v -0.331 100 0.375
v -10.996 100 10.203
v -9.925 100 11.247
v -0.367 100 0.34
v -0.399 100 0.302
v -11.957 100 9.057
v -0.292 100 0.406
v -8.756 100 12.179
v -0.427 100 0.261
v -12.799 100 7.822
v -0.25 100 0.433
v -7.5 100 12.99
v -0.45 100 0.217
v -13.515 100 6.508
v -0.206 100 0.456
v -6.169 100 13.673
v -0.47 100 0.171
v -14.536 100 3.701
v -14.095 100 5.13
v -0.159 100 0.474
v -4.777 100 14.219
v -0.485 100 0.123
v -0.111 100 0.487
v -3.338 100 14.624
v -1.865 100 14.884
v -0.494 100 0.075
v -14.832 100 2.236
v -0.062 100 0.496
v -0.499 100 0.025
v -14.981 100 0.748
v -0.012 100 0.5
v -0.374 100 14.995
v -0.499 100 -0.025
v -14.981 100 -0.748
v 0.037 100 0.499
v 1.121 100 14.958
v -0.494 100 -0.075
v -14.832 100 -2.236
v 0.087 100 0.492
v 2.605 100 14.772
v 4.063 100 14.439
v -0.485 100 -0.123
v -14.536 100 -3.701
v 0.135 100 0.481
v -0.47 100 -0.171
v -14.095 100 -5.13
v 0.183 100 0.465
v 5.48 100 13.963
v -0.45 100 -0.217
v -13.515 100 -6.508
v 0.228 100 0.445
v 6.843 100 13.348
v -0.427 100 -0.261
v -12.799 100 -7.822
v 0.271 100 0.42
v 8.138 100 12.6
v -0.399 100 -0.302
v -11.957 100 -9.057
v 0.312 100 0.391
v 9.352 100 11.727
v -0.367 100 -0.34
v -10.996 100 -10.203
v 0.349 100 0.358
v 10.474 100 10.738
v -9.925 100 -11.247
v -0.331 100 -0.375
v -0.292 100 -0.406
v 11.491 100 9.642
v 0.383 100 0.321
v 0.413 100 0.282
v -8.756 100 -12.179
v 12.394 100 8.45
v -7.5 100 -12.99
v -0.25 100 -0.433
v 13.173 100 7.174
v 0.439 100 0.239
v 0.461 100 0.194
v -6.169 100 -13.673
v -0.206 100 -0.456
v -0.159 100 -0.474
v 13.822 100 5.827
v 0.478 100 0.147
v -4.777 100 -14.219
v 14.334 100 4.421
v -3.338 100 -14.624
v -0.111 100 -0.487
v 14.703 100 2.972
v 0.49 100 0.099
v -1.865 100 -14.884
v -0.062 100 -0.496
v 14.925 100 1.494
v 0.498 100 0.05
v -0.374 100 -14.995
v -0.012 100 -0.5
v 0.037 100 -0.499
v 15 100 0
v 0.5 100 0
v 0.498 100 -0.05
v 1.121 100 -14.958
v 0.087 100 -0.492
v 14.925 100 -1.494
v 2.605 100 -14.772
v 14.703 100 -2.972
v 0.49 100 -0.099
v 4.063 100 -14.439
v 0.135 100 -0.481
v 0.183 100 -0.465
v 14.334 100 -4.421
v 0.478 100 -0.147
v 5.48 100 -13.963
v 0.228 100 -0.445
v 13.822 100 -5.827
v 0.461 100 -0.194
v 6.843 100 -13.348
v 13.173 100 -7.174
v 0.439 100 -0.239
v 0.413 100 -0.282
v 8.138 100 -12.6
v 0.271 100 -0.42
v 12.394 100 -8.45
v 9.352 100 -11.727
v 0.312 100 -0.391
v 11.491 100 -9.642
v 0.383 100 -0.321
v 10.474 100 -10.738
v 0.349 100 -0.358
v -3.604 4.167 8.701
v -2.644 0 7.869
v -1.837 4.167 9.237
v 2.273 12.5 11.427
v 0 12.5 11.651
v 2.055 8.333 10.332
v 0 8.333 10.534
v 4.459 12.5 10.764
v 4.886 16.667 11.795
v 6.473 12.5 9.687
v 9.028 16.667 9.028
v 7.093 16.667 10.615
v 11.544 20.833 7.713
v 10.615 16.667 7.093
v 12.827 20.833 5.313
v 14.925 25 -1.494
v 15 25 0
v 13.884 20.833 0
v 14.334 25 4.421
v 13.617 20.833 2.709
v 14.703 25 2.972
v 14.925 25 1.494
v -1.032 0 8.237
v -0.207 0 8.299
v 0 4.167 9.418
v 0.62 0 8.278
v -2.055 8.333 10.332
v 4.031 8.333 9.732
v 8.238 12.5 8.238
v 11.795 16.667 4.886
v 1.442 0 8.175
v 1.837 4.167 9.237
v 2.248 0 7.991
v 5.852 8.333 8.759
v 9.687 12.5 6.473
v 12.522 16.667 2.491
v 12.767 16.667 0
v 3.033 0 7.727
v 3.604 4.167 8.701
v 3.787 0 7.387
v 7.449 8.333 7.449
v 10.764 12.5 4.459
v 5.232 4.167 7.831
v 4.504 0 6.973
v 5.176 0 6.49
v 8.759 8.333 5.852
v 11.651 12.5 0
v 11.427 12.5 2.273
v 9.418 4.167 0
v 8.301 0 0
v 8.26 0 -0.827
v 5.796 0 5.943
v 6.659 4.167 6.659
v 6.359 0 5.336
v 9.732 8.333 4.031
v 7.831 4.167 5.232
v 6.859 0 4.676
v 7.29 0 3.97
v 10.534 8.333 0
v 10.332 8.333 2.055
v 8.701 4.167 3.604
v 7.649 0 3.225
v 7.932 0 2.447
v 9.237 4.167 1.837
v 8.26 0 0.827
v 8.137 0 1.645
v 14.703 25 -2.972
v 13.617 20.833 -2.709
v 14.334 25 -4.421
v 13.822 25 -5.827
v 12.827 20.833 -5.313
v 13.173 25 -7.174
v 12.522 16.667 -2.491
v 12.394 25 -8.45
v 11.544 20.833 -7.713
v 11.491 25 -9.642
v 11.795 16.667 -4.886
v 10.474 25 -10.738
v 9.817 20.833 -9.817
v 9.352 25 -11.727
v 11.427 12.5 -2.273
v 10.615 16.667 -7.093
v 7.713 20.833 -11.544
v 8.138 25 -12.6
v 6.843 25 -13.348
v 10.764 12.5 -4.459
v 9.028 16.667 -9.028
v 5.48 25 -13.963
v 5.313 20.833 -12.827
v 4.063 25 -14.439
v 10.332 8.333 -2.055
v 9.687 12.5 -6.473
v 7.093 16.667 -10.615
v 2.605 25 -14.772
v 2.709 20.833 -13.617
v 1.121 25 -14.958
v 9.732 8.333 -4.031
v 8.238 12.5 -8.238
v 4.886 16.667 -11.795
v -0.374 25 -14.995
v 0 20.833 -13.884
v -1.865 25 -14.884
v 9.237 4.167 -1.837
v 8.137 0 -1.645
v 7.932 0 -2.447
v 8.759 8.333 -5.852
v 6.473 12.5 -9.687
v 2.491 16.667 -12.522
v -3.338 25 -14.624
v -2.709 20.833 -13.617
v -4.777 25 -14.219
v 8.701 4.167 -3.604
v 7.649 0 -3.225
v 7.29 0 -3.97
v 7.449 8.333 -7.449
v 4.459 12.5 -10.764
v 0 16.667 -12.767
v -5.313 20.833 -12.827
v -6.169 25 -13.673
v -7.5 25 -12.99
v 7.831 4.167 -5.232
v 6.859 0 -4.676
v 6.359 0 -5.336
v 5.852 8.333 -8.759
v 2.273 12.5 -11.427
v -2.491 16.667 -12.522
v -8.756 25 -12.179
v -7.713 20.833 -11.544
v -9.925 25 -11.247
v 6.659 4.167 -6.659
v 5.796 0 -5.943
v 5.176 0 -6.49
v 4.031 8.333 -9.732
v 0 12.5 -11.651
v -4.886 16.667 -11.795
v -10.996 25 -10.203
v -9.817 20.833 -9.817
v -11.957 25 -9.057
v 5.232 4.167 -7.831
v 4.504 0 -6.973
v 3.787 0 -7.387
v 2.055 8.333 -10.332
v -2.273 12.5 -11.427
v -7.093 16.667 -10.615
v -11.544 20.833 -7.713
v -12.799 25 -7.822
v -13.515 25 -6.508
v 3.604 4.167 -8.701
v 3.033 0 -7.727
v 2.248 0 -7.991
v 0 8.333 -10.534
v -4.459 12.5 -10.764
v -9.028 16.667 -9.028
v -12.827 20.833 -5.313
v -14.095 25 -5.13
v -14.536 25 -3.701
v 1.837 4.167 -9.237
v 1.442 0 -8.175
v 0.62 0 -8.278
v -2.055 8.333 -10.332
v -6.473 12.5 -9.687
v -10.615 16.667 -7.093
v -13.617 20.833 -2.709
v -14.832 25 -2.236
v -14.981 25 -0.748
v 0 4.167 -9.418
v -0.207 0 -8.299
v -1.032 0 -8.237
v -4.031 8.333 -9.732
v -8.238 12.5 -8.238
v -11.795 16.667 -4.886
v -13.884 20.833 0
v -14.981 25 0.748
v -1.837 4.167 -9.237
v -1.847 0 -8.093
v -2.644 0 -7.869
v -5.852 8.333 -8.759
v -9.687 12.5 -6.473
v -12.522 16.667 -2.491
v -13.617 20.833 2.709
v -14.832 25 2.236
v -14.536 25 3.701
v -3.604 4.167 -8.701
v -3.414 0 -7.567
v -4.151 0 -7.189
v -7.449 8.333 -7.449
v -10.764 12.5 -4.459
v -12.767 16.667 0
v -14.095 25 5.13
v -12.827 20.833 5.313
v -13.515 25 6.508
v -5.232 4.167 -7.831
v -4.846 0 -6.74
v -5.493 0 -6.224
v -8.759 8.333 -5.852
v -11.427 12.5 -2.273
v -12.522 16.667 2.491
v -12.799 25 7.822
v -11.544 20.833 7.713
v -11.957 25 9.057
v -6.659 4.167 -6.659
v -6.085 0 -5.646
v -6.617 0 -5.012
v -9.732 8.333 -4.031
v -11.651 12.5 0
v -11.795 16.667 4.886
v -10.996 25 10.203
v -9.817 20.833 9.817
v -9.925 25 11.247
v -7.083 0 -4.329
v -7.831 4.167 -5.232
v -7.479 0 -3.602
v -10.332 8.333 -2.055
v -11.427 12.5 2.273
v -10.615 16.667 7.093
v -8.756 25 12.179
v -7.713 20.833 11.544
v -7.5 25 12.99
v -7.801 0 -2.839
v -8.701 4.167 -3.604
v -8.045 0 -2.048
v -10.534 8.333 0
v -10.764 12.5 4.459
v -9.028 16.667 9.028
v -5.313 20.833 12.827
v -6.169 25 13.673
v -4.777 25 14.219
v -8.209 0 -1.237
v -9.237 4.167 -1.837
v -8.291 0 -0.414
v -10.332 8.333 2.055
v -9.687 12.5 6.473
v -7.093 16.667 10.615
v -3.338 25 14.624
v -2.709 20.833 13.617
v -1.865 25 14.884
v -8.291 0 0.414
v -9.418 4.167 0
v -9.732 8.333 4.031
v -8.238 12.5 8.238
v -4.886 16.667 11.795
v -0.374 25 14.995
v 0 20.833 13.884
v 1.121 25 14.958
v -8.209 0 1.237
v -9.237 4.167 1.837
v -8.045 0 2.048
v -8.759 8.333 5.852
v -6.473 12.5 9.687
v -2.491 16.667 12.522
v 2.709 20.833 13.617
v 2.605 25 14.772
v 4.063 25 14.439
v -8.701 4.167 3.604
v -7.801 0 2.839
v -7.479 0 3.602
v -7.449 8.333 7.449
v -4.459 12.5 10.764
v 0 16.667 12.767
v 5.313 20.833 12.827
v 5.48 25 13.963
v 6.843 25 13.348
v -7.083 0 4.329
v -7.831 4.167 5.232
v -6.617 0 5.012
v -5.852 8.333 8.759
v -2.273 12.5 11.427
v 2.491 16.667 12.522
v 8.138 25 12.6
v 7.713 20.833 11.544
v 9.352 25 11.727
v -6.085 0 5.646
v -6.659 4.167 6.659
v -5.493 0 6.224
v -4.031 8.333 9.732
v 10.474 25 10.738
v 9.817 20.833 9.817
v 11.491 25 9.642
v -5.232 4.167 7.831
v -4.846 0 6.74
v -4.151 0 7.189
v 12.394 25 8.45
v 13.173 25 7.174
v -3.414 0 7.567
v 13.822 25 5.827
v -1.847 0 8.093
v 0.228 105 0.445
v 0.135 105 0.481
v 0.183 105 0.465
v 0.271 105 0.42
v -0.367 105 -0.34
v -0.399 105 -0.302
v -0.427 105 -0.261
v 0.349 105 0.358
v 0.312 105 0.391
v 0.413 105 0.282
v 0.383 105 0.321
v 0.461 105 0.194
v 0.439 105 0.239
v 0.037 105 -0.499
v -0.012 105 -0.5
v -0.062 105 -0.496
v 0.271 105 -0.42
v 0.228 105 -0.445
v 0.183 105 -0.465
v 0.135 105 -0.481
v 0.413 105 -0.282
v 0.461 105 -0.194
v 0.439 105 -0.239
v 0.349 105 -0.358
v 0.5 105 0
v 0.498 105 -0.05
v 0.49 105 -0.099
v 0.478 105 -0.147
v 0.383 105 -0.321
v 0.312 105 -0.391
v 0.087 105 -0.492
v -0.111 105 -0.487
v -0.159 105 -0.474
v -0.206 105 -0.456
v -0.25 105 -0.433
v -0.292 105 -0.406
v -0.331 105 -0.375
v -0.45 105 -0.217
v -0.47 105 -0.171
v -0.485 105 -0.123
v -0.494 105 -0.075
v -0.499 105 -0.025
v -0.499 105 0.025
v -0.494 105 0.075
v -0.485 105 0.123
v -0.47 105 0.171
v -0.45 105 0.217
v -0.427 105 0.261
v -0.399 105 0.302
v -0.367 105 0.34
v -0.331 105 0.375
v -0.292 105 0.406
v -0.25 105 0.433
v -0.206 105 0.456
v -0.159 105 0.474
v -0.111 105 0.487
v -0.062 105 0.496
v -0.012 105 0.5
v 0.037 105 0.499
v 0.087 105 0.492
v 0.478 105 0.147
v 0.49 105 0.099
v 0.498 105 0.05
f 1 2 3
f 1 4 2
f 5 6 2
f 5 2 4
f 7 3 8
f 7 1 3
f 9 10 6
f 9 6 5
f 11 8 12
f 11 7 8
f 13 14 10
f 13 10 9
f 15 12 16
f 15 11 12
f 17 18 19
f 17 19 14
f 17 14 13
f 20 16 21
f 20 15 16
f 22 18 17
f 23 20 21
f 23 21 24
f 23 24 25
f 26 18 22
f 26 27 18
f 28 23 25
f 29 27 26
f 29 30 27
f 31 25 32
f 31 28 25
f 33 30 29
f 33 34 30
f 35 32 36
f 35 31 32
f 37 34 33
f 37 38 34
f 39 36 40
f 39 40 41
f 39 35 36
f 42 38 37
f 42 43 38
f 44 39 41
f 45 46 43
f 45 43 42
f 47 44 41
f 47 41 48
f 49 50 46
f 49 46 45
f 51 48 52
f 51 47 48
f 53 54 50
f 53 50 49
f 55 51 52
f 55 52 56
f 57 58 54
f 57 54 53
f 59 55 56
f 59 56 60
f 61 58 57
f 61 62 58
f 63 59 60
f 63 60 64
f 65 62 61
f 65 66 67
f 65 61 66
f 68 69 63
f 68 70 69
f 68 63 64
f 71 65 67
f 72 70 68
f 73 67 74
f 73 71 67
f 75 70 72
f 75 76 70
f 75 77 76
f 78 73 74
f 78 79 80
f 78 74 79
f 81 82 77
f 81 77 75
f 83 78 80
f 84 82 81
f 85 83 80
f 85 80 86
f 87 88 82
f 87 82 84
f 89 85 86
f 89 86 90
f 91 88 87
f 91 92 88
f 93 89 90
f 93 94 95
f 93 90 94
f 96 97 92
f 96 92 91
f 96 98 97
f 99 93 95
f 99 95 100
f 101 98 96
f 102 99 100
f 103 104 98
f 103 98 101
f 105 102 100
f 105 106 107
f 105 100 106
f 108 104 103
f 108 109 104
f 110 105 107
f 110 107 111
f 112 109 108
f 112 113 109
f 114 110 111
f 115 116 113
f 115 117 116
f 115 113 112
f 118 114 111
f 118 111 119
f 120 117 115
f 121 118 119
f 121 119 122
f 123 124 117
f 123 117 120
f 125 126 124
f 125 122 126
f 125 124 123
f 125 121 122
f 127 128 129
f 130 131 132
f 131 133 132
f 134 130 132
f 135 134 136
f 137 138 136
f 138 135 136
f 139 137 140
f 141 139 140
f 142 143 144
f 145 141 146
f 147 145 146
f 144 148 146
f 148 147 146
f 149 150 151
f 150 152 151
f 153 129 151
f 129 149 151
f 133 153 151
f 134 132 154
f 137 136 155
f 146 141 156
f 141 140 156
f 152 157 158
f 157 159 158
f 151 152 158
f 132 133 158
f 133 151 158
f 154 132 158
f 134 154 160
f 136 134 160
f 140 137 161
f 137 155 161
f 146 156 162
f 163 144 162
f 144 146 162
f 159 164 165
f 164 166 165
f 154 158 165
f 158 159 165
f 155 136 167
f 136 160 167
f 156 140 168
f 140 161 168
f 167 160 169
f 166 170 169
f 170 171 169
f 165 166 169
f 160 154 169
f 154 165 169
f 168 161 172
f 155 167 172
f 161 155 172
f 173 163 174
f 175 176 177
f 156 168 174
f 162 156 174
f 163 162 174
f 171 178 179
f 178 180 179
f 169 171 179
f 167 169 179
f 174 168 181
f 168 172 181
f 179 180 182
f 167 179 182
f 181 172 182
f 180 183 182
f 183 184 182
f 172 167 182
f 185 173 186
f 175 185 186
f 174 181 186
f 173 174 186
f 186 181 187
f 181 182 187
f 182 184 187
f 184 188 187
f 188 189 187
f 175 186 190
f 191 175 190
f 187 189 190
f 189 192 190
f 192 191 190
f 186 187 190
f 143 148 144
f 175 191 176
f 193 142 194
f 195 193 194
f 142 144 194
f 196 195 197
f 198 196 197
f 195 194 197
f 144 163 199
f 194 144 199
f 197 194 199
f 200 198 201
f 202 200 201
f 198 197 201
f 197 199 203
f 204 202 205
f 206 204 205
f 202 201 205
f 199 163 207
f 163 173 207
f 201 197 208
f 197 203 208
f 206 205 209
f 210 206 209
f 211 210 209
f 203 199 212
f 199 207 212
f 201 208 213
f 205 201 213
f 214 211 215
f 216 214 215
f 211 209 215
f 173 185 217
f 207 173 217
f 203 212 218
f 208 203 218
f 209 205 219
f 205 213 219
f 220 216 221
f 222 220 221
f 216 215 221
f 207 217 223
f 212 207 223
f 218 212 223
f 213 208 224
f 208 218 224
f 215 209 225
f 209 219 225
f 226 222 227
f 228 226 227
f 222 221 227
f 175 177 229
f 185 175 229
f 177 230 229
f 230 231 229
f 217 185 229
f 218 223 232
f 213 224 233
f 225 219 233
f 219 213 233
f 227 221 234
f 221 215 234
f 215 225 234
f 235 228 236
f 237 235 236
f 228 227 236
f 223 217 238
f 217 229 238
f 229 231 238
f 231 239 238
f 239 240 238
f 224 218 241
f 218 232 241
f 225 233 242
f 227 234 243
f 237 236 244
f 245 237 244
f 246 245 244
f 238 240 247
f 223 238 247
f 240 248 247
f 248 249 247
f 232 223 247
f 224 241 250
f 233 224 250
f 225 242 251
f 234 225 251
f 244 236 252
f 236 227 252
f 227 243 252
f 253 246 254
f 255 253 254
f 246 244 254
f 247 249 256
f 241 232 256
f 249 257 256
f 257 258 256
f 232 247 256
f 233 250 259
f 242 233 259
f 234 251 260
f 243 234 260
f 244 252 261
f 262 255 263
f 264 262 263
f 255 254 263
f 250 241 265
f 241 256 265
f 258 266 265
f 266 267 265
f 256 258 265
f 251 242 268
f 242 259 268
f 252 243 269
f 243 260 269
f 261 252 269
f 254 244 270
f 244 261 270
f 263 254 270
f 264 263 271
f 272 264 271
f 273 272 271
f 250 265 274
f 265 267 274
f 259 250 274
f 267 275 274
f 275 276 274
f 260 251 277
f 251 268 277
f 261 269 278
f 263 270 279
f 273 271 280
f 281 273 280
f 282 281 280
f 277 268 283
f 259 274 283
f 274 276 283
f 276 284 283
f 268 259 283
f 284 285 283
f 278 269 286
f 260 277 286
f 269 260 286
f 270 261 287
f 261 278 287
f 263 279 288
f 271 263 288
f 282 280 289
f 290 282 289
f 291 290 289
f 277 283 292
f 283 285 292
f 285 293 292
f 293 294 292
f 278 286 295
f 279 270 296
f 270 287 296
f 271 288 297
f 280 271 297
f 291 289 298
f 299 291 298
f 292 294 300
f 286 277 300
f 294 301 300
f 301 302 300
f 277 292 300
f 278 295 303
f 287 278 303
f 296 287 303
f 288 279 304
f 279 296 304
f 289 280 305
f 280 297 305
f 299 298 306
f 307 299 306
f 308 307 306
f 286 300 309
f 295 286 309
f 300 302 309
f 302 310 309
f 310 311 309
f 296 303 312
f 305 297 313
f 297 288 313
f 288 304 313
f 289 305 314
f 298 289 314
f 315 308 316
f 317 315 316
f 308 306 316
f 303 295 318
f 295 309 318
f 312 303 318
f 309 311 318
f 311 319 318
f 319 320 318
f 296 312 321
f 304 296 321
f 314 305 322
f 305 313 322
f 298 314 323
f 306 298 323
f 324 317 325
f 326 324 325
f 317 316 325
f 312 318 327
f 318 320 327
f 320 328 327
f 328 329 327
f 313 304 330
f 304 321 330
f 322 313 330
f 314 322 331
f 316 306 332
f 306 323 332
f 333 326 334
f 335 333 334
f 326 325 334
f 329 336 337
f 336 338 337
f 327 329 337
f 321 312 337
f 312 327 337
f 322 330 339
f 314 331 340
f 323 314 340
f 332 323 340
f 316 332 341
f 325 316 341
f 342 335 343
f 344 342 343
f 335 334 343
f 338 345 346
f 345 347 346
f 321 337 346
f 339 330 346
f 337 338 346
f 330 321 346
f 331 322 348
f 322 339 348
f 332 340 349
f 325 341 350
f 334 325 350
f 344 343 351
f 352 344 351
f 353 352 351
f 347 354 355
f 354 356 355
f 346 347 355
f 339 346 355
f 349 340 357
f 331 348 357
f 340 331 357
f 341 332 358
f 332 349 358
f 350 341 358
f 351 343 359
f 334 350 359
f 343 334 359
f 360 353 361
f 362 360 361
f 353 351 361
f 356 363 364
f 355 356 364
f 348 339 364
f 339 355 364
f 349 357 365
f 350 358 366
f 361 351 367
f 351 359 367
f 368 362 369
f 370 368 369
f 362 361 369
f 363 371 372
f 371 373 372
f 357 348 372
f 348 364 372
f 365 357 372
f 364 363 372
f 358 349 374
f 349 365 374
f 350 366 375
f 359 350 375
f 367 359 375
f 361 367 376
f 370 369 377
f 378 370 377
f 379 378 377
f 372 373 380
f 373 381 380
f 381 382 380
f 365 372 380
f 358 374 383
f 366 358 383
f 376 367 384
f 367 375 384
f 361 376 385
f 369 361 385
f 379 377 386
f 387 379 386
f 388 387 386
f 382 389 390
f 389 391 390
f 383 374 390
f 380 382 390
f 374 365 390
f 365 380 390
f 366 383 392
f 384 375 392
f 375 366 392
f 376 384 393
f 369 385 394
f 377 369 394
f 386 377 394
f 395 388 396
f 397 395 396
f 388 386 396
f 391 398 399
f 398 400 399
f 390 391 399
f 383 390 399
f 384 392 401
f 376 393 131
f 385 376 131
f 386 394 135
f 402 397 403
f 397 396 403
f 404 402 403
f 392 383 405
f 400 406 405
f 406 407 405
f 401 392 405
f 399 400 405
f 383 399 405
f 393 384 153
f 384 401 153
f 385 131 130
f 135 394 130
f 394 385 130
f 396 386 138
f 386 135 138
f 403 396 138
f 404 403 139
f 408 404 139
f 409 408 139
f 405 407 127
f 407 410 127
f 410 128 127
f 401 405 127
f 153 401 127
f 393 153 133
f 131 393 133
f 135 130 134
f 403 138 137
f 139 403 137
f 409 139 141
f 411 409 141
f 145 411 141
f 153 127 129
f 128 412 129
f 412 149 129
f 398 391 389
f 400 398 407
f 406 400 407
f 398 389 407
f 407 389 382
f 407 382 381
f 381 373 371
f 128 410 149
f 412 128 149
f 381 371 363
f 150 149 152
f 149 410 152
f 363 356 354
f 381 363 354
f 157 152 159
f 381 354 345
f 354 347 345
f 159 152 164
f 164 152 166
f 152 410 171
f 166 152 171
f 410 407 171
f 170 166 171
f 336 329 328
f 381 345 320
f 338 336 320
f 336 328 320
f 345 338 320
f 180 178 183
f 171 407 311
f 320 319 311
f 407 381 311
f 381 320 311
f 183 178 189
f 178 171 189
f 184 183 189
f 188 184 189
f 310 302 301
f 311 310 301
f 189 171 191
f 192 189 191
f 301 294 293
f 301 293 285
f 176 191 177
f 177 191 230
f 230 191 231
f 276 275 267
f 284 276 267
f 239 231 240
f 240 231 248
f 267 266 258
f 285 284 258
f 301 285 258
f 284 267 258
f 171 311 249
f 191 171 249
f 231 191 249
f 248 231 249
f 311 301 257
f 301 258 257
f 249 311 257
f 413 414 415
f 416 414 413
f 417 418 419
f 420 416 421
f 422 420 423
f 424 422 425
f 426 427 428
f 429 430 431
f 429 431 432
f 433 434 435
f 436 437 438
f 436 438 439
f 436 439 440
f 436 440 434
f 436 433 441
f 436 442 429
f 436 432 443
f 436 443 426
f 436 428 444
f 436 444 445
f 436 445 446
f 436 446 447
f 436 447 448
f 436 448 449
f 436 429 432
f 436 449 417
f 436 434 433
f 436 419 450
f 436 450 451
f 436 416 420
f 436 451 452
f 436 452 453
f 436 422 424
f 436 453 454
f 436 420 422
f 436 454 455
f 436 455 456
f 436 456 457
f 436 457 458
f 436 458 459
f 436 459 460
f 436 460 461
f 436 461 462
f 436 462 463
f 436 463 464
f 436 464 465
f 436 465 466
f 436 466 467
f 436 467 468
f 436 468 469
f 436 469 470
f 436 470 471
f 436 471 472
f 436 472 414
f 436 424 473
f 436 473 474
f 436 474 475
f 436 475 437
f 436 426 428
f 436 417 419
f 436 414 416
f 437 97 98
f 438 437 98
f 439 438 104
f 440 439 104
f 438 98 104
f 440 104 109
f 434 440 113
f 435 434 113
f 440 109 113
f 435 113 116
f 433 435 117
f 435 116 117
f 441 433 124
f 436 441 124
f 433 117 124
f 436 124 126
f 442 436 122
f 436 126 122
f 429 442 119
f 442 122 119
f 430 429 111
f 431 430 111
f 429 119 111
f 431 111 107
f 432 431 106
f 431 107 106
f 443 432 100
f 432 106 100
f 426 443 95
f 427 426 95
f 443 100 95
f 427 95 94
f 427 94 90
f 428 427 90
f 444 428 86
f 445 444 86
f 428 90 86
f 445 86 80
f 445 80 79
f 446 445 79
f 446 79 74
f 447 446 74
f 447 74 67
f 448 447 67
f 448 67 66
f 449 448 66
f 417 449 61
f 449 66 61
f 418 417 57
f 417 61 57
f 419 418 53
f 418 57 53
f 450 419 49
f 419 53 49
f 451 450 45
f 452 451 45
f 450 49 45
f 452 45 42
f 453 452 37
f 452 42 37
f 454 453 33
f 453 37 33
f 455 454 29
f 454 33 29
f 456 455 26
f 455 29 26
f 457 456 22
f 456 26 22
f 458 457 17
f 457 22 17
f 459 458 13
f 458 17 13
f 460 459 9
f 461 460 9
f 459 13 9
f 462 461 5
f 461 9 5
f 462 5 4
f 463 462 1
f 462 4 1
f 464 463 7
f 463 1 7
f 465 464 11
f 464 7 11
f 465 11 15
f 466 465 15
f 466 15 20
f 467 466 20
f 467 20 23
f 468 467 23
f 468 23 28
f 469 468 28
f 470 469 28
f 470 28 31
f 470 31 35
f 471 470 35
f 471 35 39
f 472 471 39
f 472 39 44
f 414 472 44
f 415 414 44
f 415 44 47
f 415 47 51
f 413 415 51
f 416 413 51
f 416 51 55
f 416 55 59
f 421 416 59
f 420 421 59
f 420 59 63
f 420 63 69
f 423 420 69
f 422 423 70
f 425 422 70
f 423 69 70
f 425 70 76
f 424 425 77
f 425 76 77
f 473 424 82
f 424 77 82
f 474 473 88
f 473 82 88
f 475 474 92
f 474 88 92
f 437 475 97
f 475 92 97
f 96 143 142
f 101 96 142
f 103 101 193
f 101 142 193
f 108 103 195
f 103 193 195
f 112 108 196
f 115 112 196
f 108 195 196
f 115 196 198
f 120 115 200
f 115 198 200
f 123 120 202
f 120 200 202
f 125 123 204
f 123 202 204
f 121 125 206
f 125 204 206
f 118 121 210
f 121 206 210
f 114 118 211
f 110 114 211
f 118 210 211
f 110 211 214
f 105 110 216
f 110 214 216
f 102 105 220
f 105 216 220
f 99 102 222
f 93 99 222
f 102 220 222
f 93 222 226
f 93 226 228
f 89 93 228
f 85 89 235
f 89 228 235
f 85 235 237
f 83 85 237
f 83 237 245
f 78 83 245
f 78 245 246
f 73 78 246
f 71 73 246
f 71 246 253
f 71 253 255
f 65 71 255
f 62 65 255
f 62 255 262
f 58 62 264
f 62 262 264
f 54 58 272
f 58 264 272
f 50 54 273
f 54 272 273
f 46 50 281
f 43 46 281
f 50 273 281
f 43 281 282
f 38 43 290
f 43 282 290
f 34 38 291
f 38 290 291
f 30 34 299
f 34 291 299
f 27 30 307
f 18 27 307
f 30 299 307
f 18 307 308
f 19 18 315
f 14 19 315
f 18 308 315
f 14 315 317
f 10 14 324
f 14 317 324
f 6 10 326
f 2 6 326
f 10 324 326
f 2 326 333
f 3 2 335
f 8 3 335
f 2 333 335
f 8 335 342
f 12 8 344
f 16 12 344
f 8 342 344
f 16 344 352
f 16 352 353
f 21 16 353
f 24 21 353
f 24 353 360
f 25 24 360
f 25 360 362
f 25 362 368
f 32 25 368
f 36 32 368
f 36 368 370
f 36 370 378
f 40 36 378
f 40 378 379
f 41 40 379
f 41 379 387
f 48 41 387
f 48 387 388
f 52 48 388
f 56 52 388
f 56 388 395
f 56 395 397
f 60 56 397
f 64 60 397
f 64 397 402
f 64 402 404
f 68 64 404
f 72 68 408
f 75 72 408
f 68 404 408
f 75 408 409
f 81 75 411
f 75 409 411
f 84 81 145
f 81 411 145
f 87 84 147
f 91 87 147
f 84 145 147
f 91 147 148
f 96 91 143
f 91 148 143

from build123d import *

# Parameters (mm, degrees)
SKETCH2_R           = 15
BOSS_EXTRUDE1_DEPTH = 100
CHAMFER1_SIZE       = 25
CHAMFER1_SIZE2      = 6.698729811
SKETCH3_R           = 0.5
BOSS_EXTRUDE2_DEPTH = 5


with BuildPart() as part:
    # Sketch2 → Boss-Extrude1 (new body)
    with BuildSketch(Plane(origin=(0, 0, 0), x_dir=(1, 0, 0), z_dir=(0, 1, 0))):
        Circle(SKETCH2_R)
    extrude(amount=BOSS_EXTRUDE1_DEPTH)

    # Chamfer1
    chamfer1_edges = [part.edges().sort_by_distance(p)[0] for p in [
        (-15, 0, 0),
    ]]
    chamfer1_side = [part.faces().sort_by_distance(p)[0] for p in [
        (-15, 50, 0),
    ]]
    chamfer(chamfer1_edges, length=CHAMFER1_SIZE, length2=CHAMFER1_SIZE2, reference=chamfer1_side[0])

    # Sketch3 → Boss-Extrude2 (add)
    with BuildSketch(Plane(origin=(0, 100, 0), x_dir=(1, 0, 0), z_dir=(0, 1, 0))):
        Circle(SKETCH3_R)
    extrude(amount=BOSS_EXTRUDE2_DEPTH)


solid = part.part
